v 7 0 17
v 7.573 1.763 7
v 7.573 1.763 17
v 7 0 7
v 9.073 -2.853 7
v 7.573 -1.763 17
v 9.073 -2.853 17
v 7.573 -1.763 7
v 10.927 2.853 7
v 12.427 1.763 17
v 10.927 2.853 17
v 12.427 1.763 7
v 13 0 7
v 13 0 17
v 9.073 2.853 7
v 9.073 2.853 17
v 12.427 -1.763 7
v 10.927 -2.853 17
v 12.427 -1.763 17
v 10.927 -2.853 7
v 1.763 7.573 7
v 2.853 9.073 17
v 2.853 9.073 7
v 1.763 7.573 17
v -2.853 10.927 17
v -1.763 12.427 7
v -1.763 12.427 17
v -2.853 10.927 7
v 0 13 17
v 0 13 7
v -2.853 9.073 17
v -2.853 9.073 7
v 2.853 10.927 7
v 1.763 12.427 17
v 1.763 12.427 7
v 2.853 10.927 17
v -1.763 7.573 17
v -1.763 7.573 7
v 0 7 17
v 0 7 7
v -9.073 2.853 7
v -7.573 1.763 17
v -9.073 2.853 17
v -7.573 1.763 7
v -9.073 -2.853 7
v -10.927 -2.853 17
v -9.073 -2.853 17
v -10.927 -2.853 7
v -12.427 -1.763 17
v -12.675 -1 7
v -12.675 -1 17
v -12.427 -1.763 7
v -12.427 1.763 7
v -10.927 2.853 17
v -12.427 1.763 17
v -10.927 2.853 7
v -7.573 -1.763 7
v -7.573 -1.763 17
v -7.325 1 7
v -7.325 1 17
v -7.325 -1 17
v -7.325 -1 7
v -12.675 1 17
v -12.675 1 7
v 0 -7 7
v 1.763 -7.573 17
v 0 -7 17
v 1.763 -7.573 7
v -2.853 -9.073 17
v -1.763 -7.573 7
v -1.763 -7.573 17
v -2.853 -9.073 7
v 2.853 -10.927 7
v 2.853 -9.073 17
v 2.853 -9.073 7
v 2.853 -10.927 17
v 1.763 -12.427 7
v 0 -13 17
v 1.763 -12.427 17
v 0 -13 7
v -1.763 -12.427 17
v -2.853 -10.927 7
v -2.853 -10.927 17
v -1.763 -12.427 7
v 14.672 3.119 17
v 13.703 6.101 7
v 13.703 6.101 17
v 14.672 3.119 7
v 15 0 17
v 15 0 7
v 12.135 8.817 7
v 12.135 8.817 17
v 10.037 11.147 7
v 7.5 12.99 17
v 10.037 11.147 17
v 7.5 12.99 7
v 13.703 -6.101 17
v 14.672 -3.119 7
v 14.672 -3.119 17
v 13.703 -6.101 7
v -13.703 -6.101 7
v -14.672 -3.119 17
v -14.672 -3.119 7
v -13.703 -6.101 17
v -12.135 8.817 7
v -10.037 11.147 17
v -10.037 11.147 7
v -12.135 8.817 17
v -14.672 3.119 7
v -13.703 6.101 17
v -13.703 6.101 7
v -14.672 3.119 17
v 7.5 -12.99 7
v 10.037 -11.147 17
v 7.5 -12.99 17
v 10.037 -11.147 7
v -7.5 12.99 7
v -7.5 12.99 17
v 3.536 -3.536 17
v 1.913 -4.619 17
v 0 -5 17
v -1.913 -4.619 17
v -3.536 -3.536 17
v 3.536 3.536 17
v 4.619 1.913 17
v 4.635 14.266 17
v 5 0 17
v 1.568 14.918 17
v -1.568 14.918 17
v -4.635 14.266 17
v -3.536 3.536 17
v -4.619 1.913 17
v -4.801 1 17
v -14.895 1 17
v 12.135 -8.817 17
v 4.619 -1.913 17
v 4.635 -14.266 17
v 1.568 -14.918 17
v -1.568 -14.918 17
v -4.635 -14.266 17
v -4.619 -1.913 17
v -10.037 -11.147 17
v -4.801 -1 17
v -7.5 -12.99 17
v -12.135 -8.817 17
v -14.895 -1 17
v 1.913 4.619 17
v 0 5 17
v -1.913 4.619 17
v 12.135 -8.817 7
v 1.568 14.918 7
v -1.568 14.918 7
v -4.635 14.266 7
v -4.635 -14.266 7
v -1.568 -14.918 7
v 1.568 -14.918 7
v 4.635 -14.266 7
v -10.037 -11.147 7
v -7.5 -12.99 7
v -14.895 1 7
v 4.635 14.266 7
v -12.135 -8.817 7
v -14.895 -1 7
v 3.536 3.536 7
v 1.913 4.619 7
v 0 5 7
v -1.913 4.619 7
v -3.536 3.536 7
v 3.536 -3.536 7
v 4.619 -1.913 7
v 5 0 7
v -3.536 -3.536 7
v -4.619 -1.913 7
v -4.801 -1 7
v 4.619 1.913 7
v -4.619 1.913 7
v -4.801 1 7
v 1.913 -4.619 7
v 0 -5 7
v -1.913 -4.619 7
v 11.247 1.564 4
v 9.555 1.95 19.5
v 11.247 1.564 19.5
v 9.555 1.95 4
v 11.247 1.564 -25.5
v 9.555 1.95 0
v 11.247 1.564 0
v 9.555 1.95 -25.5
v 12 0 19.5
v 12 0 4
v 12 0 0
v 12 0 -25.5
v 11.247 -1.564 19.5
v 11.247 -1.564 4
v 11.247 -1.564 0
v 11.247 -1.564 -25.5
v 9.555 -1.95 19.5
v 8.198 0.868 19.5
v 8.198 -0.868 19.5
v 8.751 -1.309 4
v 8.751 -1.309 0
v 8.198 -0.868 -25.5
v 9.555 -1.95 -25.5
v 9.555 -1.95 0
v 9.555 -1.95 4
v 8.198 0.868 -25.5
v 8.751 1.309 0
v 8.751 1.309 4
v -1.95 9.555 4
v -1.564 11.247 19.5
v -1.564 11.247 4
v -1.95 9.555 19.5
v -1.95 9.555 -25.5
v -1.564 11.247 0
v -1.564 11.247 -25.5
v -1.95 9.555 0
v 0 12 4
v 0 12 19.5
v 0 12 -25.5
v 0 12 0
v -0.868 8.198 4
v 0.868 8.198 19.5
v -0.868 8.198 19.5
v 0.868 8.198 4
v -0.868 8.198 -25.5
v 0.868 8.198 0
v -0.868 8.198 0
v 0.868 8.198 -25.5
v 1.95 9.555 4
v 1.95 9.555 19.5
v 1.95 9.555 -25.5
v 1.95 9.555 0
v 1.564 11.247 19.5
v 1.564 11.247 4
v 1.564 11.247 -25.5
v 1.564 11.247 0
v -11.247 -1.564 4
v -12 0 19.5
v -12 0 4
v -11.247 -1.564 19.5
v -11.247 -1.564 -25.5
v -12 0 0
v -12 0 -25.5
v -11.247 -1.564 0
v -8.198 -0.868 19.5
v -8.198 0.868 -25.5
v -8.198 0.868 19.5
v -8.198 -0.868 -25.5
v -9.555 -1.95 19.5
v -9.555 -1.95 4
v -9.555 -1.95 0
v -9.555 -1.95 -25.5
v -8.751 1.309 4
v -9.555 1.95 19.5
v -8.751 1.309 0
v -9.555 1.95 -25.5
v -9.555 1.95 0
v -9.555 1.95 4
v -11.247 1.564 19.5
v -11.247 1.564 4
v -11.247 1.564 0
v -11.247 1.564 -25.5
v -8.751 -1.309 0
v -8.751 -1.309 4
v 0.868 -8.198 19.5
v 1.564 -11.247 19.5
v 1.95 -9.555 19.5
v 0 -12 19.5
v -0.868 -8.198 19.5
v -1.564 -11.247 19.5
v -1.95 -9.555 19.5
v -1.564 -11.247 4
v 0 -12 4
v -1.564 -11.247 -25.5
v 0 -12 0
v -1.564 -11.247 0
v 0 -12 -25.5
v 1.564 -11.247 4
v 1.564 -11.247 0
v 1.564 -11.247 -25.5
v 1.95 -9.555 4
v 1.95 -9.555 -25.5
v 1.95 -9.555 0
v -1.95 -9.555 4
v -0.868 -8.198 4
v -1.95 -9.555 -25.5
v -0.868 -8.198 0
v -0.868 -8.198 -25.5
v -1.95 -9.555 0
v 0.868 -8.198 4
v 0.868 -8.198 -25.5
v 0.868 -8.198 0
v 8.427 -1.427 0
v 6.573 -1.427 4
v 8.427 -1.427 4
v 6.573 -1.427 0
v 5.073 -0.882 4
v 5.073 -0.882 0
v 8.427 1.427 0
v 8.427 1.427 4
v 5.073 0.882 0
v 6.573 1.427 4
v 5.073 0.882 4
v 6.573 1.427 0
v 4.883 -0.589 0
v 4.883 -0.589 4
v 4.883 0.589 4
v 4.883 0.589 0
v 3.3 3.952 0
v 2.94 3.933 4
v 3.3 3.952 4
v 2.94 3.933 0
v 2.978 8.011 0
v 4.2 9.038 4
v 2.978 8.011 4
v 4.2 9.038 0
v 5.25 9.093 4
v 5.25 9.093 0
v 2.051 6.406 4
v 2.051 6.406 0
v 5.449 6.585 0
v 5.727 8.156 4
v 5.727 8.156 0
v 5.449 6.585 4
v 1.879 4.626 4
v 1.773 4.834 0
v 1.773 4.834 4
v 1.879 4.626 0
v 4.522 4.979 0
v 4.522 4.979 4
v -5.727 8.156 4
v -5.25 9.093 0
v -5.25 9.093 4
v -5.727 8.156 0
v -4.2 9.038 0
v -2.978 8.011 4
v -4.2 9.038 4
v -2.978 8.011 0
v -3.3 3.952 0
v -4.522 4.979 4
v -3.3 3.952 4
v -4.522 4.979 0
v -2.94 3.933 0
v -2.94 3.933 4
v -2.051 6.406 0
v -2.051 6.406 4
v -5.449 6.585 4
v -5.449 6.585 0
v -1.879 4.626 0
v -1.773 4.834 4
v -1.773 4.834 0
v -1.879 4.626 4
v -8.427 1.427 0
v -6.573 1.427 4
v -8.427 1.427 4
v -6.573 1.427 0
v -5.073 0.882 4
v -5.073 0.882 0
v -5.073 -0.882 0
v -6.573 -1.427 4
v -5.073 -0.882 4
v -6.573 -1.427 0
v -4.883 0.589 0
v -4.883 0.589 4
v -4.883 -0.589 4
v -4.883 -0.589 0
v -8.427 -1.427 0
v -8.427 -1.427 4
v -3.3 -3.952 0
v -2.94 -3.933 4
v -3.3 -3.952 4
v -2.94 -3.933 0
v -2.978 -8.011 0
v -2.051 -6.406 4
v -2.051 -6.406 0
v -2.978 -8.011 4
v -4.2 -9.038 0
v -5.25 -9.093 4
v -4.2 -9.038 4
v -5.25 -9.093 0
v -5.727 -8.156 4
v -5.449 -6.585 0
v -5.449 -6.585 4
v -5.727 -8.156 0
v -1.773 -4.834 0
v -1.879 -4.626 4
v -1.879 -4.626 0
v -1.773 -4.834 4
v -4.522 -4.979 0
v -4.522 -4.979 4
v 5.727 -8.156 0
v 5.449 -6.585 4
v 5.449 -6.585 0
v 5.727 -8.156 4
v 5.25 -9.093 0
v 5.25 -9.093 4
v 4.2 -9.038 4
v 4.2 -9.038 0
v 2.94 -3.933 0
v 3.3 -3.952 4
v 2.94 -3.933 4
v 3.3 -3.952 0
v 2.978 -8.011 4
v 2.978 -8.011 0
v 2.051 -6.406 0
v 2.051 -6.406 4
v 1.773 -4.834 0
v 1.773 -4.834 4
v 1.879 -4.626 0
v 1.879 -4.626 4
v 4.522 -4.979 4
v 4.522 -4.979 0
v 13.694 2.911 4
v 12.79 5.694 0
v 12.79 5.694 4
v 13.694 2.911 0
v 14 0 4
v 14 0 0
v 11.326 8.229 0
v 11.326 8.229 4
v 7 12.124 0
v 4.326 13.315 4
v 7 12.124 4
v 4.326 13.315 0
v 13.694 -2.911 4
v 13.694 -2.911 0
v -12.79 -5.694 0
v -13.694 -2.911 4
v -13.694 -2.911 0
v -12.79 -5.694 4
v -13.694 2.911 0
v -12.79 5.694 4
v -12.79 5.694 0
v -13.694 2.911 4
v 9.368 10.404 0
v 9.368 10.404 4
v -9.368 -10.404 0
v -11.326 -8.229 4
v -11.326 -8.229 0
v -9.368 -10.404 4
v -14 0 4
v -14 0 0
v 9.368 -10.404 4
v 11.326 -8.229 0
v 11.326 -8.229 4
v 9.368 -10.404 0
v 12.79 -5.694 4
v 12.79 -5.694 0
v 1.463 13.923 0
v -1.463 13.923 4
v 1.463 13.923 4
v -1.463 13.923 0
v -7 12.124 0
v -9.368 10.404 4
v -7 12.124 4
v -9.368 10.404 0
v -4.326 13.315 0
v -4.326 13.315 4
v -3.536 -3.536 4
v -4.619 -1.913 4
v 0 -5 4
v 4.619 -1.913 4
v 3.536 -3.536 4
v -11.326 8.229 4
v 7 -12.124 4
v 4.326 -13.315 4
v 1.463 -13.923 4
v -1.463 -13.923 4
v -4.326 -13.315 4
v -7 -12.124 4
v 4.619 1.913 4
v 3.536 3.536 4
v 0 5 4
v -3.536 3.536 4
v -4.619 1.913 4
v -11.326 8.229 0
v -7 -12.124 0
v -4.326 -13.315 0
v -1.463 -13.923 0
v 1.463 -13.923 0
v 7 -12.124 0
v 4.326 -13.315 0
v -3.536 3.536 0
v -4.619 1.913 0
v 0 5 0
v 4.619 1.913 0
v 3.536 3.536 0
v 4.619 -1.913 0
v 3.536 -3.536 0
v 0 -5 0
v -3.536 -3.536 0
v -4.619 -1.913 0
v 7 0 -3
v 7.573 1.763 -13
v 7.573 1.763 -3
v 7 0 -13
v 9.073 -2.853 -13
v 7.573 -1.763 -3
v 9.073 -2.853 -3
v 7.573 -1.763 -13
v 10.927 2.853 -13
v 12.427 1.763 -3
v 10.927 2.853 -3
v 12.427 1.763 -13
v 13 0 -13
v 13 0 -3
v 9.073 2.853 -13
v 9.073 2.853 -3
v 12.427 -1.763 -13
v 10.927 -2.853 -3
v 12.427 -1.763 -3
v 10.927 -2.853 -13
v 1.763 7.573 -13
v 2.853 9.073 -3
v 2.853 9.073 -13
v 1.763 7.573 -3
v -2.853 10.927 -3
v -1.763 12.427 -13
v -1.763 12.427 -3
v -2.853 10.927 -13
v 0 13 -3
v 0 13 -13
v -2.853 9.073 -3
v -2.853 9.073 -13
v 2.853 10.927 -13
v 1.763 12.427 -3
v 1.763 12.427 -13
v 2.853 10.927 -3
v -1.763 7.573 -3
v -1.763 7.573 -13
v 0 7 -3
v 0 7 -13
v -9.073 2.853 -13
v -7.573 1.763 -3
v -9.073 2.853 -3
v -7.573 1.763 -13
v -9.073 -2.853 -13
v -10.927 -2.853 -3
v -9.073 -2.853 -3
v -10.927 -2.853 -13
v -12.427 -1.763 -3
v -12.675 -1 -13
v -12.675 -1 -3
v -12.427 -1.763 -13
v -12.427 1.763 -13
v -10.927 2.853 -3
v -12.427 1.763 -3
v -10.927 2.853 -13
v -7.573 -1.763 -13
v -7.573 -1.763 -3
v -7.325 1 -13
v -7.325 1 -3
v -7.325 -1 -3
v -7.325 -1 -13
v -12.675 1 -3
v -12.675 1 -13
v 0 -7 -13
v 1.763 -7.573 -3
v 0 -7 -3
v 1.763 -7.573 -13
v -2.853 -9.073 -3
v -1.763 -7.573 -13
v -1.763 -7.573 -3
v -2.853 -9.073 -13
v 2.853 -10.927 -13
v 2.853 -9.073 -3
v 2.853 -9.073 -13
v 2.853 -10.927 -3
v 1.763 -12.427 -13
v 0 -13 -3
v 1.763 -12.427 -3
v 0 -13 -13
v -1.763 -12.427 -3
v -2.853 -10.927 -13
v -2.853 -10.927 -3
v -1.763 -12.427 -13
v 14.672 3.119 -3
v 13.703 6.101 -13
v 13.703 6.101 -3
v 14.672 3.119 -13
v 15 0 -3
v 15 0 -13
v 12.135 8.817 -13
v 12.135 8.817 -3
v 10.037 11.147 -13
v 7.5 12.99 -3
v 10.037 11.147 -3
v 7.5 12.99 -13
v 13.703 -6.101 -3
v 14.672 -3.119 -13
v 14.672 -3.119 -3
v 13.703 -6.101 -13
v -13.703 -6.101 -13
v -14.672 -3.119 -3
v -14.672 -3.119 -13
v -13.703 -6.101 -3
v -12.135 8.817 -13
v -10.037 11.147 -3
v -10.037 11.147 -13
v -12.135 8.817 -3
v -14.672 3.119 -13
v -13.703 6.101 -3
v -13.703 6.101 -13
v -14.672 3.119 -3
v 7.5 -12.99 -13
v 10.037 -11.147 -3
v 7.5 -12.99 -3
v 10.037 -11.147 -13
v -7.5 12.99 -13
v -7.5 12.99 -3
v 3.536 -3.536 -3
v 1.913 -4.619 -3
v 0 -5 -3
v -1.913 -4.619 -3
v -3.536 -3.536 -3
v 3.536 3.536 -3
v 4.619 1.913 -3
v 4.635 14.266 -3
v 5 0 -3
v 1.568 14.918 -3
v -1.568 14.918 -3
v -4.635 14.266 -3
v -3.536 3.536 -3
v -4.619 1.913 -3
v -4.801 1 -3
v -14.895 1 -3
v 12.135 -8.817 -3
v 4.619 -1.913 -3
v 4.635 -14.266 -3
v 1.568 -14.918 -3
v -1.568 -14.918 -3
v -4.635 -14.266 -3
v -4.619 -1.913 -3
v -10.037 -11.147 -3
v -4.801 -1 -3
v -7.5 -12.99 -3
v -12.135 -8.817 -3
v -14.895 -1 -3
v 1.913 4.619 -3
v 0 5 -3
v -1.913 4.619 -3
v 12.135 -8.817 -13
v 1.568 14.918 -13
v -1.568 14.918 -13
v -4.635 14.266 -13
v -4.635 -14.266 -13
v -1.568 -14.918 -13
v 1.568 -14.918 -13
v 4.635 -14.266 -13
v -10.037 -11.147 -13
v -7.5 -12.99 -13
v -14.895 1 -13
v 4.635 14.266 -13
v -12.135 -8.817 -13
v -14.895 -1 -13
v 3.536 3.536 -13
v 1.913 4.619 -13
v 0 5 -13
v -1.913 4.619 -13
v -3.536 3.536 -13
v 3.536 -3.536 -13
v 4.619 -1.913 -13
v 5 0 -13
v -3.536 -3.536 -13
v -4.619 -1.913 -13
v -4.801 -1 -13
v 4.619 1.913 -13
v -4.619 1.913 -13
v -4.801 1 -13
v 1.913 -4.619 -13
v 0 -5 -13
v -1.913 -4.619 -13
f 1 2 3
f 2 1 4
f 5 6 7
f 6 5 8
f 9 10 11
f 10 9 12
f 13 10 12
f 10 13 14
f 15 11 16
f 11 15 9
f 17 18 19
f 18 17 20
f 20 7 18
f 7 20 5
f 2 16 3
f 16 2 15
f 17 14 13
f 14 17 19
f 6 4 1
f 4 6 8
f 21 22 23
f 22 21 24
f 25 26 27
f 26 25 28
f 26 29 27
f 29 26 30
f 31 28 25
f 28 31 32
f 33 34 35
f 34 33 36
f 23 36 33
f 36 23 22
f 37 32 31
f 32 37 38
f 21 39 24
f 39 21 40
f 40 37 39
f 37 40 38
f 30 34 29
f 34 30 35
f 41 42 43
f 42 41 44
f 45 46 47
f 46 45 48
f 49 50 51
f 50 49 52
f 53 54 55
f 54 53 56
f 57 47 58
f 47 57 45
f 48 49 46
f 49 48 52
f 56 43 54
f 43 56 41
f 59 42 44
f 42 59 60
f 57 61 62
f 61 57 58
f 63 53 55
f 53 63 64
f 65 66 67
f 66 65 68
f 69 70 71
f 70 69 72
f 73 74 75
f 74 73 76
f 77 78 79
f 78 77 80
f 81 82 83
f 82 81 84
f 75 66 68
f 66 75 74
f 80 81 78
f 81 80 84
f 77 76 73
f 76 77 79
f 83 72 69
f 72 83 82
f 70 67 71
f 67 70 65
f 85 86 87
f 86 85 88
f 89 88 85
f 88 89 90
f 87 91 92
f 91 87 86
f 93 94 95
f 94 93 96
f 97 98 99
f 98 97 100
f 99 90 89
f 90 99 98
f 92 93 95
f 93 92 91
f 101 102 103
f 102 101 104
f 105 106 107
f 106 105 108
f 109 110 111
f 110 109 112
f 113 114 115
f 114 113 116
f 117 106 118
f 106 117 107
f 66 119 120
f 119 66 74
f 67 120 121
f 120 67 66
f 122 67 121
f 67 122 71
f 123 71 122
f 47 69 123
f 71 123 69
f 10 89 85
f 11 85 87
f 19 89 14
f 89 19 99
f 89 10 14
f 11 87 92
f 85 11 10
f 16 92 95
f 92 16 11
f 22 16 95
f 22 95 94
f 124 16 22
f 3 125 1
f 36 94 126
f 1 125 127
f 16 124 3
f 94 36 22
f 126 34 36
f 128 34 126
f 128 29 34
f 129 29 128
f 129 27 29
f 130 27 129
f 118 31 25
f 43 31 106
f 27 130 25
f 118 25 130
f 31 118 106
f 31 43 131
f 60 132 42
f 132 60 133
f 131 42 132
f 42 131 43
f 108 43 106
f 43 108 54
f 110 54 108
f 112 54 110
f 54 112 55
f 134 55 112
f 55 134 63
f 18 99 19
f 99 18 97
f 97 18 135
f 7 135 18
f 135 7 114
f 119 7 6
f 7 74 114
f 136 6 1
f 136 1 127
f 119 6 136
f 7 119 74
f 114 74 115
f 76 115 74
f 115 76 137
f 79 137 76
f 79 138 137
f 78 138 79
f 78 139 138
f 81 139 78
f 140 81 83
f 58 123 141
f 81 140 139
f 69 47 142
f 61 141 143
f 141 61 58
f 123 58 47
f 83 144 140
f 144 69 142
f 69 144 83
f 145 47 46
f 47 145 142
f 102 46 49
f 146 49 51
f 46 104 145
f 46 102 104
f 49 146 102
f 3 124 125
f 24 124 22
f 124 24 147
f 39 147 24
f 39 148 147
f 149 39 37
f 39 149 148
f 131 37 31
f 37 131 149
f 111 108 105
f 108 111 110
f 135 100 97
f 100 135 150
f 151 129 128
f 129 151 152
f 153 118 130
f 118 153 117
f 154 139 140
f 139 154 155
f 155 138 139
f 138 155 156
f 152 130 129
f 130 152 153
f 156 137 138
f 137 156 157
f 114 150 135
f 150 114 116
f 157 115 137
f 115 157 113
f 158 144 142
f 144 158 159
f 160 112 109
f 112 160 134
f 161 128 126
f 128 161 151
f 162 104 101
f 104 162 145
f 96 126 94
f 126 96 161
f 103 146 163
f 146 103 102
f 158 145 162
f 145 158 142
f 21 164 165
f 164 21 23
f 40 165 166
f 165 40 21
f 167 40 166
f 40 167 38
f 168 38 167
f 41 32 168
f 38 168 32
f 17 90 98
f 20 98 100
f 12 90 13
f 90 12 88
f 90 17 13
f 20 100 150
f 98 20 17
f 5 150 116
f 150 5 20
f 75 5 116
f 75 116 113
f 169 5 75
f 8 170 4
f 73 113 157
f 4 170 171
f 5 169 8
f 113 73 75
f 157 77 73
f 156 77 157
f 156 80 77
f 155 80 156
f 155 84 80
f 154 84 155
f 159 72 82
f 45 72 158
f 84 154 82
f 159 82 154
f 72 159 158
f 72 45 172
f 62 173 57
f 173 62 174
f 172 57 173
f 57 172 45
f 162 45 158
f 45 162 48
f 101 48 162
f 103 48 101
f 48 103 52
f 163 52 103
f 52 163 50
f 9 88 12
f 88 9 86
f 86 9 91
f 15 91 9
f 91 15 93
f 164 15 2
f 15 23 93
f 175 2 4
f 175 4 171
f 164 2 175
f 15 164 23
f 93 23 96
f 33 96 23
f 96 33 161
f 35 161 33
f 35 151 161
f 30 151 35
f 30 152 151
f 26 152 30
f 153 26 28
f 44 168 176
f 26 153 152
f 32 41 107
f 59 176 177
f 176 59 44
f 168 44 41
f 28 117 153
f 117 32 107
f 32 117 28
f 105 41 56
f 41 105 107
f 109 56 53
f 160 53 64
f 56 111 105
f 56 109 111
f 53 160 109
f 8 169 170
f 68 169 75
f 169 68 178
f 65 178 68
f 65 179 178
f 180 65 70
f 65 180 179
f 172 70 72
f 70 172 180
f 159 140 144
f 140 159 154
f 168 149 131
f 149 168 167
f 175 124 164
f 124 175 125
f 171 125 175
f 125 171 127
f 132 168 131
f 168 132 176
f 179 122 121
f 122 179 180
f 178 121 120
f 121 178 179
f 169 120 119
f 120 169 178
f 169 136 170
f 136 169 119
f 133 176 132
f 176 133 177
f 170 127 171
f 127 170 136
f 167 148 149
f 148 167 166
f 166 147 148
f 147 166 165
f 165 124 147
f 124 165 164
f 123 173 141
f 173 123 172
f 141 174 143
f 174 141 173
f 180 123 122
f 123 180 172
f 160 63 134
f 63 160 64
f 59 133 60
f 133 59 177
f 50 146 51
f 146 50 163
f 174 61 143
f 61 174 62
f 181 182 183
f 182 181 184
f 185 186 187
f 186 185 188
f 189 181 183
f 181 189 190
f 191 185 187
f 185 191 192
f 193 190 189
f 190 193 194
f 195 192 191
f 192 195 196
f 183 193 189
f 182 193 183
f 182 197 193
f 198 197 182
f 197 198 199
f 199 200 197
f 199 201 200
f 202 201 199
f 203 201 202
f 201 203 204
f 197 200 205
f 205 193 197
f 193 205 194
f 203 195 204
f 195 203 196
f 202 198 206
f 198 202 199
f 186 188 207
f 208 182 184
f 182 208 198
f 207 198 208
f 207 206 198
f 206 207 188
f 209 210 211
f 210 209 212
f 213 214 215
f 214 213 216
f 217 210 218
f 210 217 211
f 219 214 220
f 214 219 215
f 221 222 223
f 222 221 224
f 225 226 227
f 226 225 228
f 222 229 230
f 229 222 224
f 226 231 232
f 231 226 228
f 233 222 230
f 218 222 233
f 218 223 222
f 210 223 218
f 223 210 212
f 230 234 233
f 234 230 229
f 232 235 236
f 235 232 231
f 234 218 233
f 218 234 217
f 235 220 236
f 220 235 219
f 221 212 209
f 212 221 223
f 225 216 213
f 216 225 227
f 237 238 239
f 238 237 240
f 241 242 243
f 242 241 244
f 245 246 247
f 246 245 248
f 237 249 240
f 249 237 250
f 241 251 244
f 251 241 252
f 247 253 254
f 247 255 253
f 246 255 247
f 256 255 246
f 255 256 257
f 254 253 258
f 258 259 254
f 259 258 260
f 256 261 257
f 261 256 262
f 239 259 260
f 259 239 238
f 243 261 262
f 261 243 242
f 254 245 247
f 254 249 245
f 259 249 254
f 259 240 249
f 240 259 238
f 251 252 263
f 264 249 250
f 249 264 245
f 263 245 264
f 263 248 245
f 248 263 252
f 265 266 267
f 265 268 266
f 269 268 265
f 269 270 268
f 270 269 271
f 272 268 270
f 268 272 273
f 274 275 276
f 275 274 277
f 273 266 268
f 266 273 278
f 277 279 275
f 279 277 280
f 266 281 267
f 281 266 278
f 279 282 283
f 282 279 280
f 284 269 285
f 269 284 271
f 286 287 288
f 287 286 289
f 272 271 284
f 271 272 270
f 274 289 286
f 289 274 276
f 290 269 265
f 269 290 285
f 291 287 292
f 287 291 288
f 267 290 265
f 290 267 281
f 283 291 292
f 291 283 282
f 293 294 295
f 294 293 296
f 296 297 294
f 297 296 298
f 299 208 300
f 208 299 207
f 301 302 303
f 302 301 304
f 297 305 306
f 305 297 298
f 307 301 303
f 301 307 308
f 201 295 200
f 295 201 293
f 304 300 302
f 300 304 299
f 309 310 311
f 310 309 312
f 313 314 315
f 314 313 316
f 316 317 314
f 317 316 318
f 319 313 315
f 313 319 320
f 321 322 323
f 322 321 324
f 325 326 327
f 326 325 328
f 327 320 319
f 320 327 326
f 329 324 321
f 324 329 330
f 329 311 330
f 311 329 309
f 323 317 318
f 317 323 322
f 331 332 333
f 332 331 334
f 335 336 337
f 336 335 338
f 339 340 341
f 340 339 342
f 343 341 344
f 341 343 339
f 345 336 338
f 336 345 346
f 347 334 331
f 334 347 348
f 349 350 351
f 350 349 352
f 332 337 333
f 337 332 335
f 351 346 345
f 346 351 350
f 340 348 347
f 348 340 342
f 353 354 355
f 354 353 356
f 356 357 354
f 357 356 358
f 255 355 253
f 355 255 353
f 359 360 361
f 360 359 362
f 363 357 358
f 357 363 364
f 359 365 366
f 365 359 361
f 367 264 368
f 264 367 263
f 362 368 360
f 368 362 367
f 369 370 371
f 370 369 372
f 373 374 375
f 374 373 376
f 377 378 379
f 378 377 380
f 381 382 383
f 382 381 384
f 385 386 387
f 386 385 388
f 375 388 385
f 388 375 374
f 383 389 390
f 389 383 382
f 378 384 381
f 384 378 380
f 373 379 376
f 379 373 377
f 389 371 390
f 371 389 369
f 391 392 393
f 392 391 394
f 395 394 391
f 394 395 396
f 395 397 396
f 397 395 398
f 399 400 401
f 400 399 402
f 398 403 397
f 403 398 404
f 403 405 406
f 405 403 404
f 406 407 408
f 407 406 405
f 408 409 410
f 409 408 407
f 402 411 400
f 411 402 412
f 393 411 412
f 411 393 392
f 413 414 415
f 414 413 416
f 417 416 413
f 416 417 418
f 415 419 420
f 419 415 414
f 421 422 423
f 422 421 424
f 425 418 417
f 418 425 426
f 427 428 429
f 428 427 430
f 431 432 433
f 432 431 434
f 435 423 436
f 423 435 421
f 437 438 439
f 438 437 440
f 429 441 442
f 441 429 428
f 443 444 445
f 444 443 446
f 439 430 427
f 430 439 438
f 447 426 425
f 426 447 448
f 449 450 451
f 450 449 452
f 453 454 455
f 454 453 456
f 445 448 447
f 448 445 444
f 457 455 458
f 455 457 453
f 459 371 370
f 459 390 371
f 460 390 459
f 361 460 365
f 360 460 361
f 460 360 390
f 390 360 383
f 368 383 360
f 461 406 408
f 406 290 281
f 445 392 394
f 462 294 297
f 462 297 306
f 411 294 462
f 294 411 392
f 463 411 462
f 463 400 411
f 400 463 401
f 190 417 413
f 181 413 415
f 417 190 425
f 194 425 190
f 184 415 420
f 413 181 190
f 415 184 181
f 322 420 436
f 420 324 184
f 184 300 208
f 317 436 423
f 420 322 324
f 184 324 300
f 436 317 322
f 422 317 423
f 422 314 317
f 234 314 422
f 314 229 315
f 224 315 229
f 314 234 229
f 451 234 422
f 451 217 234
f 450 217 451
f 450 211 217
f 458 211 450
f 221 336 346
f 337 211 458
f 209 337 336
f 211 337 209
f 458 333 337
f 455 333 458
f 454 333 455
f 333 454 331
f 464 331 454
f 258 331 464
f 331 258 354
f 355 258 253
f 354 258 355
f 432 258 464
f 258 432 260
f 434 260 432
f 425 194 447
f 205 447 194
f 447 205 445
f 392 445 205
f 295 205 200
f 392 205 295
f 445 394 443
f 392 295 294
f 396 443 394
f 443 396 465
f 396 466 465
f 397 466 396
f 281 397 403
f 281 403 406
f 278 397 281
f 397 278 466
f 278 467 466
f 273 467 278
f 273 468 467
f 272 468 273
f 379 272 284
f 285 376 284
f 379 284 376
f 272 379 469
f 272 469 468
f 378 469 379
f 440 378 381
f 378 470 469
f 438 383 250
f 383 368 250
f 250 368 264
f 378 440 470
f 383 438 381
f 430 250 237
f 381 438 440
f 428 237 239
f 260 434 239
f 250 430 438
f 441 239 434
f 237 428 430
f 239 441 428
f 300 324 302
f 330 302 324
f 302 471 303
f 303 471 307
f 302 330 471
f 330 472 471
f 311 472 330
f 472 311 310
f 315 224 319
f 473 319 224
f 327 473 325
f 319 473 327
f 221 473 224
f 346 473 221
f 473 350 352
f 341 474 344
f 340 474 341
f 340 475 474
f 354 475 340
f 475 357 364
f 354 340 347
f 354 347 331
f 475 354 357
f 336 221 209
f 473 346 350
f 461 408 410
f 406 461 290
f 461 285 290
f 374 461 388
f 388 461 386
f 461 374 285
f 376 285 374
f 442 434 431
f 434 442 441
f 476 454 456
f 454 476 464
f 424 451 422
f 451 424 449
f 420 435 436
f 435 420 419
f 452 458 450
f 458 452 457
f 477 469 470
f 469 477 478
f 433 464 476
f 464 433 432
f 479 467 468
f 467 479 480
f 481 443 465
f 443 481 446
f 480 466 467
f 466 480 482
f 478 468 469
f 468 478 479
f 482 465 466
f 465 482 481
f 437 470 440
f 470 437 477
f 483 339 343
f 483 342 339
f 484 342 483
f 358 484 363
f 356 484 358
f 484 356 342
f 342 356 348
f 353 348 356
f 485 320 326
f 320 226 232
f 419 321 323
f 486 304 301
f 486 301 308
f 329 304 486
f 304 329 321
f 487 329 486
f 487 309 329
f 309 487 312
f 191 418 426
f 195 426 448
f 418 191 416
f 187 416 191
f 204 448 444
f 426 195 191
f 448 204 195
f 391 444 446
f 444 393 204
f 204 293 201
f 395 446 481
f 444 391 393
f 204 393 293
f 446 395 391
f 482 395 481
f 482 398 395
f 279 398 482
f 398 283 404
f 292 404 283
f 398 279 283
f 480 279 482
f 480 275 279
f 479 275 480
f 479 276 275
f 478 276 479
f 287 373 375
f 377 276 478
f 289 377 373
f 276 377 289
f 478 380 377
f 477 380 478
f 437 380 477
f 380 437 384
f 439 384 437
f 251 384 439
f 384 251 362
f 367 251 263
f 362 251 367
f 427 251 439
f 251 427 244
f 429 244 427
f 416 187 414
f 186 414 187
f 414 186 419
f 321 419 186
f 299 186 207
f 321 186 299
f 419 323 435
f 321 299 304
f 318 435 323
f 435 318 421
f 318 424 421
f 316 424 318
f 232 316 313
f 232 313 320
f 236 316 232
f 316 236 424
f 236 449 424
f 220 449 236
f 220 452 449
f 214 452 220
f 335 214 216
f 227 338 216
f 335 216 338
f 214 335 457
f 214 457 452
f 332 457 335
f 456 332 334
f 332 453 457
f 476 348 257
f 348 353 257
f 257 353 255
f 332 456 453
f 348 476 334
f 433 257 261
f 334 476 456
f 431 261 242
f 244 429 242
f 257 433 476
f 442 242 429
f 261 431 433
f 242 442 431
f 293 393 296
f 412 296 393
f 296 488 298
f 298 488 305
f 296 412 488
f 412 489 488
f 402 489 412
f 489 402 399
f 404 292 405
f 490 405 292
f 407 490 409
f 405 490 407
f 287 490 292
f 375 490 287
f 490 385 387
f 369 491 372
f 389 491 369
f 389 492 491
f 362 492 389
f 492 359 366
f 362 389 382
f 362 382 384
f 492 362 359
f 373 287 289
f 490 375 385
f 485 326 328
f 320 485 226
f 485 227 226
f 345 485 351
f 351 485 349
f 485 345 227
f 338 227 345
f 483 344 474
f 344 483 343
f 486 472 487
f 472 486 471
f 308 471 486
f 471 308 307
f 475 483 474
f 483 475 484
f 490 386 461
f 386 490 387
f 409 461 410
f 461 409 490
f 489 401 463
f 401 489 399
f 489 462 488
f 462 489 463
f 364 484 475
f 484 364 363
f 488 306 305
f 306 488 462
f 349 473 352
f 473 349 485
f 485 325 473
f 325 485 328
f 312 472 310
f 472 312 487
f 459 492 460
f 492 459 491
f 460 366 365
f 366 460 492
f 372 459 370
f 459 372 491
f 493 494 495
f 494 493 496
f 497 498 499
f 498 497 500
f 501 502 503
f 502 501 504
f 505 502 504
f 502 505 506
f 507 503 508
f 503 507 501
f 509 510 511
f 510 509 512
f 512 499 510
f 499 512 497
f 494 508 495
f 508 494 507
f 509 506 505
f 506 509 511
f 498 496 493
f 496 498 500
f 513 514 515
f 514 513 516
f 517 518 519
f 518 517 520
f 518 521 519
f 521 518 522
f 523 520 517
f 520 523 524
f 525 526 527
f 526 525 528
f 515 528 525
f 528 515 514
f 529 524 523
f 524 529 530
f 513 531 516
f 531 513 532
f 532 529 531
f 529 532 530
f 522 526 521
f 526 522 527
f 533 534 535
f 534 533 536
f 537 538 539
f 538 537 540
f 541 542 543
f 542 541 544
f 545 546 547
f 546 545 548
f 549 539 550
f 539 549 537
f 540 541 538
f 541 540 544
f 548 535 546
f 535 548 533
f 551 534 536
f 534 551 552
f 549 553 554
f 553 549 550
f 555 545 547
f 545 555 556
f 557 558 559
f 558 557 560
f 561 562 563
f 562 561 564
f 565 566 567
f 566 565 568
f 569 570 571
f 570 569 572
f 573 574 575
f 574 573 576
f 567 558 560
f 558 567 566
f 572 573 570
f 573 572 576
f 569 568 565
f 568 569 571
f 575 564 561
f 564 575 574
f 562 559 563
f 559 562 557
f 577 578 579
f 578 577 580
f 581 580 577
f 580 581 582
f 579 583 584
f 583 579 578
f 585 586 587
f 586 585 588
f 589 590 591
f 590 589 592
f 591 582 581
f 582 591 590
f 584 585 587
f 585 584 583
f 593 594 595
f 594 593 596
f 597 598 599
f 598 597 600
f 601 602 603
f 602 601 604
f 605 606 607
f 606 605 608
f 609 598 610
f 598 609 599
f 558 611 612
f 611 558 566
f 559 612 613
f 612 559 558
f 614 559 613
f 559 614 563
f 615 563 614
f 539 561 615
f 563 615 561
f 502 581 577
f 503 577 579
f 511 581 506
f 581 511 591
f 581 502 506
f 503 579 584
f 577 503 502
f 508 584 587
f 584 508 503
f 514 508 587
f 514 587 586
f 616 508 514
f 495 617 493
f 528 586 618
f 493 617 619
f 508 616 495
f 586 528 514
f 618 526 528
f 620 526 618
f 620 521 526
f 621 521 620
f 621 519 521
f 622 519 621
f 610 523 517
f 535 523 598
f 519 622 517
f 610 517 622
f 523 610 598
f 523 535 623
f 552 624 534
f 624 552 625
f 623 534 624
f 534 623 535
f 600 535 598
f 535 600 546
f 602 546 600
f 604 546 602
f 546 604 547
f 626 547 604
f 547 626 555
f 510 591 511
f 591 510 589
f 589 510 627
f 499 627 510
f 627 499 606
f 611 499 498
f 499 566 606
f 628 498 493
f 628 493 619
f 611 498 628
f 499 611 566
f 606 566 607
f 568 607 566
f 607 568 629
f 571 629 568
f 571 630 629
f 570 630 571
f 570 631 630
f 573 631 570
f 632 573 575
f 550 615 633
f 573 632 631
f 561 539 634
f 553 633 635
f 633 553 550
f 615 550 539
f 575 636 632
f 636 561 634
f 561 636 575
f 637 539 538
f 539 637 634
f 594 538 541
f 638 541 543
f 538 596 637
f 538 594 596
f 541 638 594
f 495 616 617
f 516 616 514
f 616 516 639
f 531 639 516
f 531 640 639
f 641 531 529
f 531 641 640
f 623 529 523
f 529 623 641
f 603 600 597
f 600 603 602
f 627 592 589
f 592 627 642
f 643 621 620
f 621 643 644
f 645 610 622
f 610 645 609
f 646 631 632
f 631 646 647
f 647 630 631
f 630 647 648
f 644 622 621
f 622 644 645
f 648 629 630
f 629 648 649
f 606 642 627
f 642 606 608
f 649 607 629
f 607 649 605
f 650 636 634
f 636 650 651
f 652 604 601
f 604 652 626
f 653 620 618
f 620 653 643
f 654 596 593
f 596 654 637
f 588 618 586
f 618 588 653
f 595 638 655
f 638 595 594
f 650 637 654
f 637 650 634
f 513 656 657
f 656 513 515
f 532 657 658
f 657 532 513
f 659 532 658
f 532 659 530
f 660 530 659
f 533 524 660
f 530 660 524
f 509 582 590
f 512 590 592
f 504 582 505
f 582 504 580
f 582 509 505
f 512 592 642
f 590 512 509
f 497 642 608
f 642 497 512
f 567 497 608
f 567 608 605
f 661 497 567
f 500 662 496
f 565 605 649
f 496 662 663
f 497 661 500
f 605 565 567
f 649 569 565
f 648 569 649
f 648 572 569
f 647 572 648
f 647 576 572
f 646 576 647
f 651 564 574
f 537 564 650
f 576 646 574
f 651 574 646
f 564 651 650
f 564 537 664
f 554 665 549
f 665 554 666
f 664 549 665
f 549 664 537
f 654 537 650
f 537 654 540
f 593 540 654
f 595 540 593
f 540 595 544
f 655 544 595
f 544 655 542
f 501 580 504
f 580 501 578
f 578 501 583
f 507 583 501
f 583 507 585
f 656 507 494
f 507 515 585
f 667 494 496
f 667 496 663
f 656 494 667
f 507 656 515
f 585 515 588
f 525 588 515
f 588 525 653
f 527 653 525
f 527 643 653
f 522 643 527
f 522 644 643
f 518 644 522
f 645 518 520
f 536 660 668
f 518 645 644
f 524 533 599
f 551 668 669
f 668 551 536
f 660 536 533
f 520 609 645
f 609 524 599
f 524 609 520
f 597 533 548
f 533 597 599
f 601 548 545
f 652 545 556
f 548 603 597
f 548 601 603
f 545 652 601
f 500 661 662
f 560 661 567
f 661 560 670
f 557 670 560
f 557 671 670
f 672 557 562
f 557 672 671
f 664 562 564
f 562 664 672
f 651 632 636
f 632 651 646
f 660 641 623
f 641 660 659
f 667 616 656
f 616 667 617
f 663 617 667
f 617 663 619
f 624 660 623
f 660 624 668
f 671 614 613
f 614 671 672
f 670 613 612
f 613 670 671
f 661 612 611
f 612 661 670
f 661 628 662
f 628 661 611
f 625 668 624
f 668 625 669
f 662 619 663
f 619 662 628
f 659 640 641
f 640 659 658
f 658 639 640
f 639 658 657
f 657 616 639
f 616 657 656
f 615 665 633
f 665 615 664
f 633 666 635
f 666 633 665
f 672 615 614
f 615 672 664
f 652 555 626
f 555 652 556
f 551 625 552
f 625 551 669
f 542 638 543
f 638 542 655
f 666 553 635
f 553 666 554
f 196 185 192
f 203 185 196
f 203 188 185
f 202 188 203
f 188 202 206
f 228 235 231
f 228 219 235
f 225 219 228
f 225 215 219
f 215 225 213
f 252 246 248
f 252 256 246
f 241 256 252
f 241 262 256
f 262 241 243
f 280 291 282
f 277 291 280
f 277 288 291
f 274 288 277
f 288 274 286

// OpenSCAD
// Parameters
hub_diameter = 30;
hub_height = 10; // Ensuring two hubs are present
bore_diameter = 10;
fastening_hole_diameter = 6; // Enlarged to match the original model
fastening_hole_offset = 10; // Adjusted hole positions
slit_width = 2;
slit_depth = hub_diameter / 2; // Extended slit depth
spacer_thickness = 4; // Increased thickness for better flexibility
spacer_wavy_amplitude = 3; // More pronounced wavy shape
spacer_wavy_frequency = 6; // More distinct wavy pattern
screw_diameter = 4;
screw_length = 25; // Extended to pass through both hubs and spacer

// Module for a single hub
module hub() {
    difference() {
        cylinder(d=hub_diameter, h=hub_height, center=true);
        
        // Central bore
        cylinder(d=bore_diameter, h=hub_height + 2, center=true);
        
        // Fastening holes
        for (i = [0:3]) {
            rotate([0, 0, i * 90])
                translate([fastening_hole_offset, 0, 0])
                cylinder(d=fastening_hole_diameter, h=hub_height + 2, center=true);
        }
        
        // Slit for clamping flexibility (extended depth)
        translate([-hub_diameter/2, 0, 0])
            cube([hub_diameter, slit_width, hub_height + 2], center=true);
        
        // Additional cut to extend slit towards the center
        translate([-slit_depth, 0, 0])
            cube([slit_depth, slit_width, hub_height + 2], center=true);
    }
}

// Module for the flexible spacer
module flexible_spacer() {
    difference() {
        cylinder(d=hub_diameter - 2, h=spacer_thickness, center=true);
        
        // Central bore
        cylinder(d=bore_diameter, h=spacer_thickness + 2, center=true);
        
        // Wavy profile (more distinct)
        for (i = [0:spacer_wavy_frequency-1]) {
            rotate([0, 0, i * (360 / spacer_wavy_frequency)])
                translate([hub_diameter/4, 0, 0])
                scale([1, 0.5, 1])
                cylinder(d=spacer_wavy_amplitude * 2, h=spacer_thickness + 2, center=true);
        }
    }
}

// Module for a fastening screw
module fastening_screw() {
    translate([0, 0, -hub_height/2])
        cylinder(d=screw_diameter, h=screw_length, center=true);
}

// Assembly
module flexible_coupling() {
    // Top hub
    translate([0, 0, hub_height + spacer_thickness/2])
        hub();
    
    // Fastening screws (top layer, correctly positioned)
    for (i = [0:3]) {
        rotate([0, 0, i * 90])
            translate([fastening_hole_offset, 0, hub_height + spacer_thickness/2])
            fastening_screw();
    }
    
    // Flexible spacer
    translate([0, 0, spacer_thickness/2])
        flexible_spacer();
    
    // Fastening screws (middle layer, correctly positioned)
    for (i = [0:3]) {
        rotate([0, 0, i * 90])
            translate([fastening_hole_offset, 0, spacer_thickness/2])
            fastening_screw();
    }
    
    // Bottom hub
    translate([0, 0, -hub_height + spacer_thickness/2])
        hub();
    
    // Fastening screws (bottom layer, correctly positioned)
    for (i = [0:3]) {
        rotate([0, 0, i * 90])
            translate([fastening_hole_offset, 0, -hub_height + spacer_thickness/2])
            fastening_screw();
    }
}

// Render the full model
flexible_coupling();
